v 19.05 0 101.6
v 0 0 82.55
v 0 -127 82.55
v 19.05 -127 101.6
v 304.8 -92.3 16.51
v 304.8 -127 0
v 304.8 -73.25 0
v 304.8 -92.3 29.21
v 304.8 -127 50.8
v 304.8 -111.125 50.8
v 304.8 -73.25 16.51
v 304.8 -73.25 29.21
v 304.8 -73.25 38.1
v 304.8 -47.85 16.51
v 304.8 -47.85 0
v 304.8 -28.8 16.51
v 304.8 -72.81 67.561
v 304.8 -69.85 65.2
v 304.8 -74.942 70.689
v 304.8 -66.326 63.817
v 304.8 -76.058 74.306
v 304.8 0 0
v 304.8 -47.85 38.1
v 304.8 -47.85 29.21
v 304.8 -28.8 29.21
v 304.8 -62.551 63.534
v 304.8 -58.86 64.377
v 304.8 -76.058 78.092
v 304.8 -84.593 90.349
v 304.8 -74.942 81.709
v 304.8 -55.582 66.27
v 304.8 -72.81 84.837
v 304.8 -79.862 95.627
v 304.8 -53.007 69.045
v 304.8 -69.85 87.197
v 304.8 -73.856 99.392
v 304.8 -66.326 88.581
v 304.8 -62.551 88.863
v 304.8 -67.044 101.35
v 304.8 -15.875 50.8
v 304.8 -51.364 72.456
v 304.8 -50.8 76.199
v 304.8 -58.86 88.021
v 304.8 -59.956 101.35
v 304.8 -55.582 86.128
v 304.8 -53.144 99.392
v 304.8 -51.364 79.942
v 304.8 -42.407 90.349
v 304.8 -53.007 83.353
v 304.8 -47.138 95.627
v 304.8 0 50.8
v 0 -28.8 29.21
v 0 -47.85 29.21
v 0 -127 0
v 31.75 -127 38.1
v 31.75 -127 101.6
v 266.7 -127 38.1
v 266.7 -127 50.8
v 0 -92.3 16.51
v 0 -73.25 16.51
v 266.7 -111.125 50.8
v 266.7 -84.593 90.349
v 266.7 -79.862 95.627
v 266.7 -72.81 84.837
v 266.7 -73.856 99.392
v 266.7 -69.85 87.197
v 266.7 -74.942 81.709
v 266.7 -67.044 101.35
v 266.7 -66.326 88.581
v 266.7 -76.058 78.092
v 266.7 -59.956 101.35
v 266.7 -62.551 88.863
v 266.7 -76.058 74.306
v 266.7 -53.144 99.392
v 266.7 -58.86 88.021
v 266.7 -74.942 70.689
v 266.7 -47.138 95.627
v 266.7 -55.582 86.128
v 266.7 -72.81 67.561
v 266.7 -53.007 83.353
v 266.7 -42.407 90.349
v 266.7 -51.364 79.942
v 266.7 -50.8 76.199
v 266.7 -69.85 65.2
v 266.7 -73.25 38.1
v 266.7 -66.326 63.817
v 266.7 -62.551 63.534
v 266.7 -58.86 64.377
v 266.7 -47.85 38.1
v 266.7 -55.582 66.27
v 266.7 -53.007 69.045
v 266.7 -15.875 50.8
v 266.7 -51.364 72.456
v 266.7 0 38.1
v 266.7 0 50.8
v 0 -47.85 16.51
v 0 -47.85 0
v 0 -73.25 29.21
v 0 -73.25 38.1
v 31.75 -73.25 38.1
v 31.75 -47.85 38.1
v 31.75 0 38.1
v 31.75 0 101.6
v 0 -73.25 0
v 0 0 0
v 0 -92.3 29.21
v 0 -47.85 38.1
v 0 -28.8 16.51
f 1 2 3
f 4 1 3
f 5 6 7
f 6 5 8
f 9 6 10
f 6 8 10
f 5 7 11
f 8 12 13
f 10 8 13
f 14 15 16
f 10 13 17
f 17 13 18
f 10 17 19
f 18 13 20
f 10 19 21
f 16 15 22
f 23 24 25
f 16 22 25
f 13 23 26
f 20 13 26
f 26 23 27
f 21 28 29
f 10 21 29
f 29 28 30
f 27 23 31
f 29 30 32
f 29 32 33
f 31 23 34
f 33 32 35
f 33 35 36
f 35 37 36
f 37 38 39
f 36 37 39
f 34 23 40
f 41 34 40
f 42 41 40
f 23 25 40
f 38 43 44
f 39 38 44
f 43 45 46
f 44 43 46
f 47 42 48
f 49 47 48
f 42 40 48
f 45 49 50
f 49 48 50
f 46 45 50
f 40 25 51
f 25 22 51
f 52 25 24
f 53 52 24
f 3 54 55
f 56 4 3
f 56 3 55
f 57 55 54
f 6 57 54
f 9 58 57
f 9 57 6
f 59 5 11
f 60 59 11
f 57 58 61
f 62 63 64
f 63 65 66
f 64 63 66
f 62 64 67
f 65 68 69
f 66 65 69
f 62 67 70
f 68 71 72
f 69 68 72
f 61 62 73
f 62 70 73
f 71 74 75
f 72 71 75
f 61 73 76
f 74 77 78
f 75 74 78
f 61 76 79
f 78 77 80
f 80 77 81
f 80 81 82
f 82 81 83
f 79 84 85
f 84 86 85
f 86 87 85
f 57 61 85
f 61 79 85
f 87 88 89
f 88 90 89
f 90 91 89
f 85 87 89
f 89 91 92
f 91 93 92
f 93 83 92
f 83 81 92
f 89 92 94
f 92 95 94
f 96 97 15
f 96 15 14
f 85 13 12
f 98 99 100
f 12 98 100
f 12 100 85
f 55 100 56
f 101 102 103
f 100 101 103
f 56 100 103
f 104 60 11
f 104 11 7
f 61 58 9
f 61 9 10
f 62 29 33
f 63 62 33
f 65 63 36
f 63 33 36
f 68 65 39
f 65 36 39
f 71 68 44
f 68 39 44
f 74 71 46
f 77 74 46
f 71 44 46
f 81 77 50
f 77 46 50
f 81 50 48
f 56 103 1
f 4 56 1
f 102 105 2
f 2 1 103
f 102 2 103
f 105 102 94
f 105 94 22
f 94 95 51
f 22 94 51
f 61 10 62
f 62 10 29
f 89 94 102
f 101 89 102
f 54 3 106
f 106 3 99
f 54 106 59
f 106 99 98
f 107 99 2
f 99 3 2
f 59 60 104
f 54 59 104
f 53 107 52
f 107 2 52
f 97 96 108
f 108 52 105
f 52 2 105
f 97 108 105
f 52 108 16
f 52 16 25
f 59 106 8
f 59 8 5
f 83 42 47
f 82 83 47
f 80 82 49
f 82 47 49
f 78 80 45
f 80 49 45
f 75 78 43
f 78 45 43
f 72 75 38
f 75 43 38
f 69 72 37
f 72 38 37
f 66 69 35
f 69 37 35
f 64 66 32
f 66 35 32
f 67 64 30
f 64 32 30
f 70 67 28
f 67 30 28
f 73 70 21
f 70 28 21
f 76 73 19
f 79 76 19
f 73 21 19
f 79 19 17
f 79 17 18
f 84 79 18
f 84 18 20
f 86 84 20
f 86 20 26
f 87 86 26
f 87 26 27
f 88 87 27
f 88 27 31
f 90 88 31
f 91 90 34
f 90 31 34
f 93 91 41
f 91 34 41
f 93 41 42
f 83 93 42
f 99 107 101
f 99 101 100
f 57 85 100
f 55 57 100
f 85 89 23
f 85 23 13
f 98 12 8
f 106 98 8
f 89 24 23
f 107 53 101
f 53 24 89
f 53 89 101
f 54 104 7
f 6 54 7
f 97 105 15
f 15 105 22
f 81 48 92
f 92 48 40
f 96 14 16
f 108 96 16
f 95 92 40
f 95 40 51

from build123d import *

# Parameters (mm, degrees)
F1_DEPTH = 127
F2_SIZE  = 19.05
F4_DEPTH = 304.8
F5_R     = 12.7
F6_DEPTH = 38.1


with BuildPart() as f1:
    # F0 (on Front) → F1 (new body)
    with BuildSketch(Plane.XZ):
        Polygon((31.75, 101.6), (0, 101.6), (0, 0), (304.8, 0), (304.8, 101.6), (266.7, 101.6), (266.7, 38.1), (31.75, 38.1), align=None)
    extrude(amount=F1_DEPTH)

    # F2
    f2_edges = [f1.edges().sort_by_distance(p)[0] for p in [
        (0, -63.5, 101.6),
    ]]
    chamfer(f2_edges, length=F2_SIZE)

    # F3 (on Right) → F4 (cut, through all)
    with BuildSketch(Plane.YZ):
        Polygon((-73.250479, 0), (-47.850479, 0), (-47.850479, 16.51), (-28.800479, 16.51), (-28.800479, 29.21), (-47.850479, 29.21), (-47.850479, 38.1), (-73.250479, 38.1), (-73.250479, 29.21), (-92.300479, 29.21), (-92.300479, 16.51), (-73.250479, 16.51), align=None)
    extrude(amount=F4_DEPTH, mode=Mode.SUBTRACT)

    # F5 (on face) → F6 (cut, through all)
    with BuildSketch(Plane.YZ.offset(304.8)):
        with BuildLine():
            Line((-127, 101.6), (-127, 50.8))
            Line((-127, 50.8), (-111.125, 50.8))
            Line((-111.125, 50.8), (-84.593251, 90.349379))
            ThreePointArc((-84.593251, 90.349379), (-63.5, 101.598947), (-42.406749, 90.349379))
            Line((-42.406749, 90.349379), (-15.875, 50.8))
            Line((-15.875, 50.8), (0, 50.8))
            Line((0, 50.8), (0, 101.6))
            Line((0, 101.6), (-127, 101.6))
        make_face()
        with Locations((-63.5, 76.198947)):
            Circle(F5_R)
    extrude(amount=-F6_DEPTH, mode=Mode.SUBTRACT)


solid = f1.part
